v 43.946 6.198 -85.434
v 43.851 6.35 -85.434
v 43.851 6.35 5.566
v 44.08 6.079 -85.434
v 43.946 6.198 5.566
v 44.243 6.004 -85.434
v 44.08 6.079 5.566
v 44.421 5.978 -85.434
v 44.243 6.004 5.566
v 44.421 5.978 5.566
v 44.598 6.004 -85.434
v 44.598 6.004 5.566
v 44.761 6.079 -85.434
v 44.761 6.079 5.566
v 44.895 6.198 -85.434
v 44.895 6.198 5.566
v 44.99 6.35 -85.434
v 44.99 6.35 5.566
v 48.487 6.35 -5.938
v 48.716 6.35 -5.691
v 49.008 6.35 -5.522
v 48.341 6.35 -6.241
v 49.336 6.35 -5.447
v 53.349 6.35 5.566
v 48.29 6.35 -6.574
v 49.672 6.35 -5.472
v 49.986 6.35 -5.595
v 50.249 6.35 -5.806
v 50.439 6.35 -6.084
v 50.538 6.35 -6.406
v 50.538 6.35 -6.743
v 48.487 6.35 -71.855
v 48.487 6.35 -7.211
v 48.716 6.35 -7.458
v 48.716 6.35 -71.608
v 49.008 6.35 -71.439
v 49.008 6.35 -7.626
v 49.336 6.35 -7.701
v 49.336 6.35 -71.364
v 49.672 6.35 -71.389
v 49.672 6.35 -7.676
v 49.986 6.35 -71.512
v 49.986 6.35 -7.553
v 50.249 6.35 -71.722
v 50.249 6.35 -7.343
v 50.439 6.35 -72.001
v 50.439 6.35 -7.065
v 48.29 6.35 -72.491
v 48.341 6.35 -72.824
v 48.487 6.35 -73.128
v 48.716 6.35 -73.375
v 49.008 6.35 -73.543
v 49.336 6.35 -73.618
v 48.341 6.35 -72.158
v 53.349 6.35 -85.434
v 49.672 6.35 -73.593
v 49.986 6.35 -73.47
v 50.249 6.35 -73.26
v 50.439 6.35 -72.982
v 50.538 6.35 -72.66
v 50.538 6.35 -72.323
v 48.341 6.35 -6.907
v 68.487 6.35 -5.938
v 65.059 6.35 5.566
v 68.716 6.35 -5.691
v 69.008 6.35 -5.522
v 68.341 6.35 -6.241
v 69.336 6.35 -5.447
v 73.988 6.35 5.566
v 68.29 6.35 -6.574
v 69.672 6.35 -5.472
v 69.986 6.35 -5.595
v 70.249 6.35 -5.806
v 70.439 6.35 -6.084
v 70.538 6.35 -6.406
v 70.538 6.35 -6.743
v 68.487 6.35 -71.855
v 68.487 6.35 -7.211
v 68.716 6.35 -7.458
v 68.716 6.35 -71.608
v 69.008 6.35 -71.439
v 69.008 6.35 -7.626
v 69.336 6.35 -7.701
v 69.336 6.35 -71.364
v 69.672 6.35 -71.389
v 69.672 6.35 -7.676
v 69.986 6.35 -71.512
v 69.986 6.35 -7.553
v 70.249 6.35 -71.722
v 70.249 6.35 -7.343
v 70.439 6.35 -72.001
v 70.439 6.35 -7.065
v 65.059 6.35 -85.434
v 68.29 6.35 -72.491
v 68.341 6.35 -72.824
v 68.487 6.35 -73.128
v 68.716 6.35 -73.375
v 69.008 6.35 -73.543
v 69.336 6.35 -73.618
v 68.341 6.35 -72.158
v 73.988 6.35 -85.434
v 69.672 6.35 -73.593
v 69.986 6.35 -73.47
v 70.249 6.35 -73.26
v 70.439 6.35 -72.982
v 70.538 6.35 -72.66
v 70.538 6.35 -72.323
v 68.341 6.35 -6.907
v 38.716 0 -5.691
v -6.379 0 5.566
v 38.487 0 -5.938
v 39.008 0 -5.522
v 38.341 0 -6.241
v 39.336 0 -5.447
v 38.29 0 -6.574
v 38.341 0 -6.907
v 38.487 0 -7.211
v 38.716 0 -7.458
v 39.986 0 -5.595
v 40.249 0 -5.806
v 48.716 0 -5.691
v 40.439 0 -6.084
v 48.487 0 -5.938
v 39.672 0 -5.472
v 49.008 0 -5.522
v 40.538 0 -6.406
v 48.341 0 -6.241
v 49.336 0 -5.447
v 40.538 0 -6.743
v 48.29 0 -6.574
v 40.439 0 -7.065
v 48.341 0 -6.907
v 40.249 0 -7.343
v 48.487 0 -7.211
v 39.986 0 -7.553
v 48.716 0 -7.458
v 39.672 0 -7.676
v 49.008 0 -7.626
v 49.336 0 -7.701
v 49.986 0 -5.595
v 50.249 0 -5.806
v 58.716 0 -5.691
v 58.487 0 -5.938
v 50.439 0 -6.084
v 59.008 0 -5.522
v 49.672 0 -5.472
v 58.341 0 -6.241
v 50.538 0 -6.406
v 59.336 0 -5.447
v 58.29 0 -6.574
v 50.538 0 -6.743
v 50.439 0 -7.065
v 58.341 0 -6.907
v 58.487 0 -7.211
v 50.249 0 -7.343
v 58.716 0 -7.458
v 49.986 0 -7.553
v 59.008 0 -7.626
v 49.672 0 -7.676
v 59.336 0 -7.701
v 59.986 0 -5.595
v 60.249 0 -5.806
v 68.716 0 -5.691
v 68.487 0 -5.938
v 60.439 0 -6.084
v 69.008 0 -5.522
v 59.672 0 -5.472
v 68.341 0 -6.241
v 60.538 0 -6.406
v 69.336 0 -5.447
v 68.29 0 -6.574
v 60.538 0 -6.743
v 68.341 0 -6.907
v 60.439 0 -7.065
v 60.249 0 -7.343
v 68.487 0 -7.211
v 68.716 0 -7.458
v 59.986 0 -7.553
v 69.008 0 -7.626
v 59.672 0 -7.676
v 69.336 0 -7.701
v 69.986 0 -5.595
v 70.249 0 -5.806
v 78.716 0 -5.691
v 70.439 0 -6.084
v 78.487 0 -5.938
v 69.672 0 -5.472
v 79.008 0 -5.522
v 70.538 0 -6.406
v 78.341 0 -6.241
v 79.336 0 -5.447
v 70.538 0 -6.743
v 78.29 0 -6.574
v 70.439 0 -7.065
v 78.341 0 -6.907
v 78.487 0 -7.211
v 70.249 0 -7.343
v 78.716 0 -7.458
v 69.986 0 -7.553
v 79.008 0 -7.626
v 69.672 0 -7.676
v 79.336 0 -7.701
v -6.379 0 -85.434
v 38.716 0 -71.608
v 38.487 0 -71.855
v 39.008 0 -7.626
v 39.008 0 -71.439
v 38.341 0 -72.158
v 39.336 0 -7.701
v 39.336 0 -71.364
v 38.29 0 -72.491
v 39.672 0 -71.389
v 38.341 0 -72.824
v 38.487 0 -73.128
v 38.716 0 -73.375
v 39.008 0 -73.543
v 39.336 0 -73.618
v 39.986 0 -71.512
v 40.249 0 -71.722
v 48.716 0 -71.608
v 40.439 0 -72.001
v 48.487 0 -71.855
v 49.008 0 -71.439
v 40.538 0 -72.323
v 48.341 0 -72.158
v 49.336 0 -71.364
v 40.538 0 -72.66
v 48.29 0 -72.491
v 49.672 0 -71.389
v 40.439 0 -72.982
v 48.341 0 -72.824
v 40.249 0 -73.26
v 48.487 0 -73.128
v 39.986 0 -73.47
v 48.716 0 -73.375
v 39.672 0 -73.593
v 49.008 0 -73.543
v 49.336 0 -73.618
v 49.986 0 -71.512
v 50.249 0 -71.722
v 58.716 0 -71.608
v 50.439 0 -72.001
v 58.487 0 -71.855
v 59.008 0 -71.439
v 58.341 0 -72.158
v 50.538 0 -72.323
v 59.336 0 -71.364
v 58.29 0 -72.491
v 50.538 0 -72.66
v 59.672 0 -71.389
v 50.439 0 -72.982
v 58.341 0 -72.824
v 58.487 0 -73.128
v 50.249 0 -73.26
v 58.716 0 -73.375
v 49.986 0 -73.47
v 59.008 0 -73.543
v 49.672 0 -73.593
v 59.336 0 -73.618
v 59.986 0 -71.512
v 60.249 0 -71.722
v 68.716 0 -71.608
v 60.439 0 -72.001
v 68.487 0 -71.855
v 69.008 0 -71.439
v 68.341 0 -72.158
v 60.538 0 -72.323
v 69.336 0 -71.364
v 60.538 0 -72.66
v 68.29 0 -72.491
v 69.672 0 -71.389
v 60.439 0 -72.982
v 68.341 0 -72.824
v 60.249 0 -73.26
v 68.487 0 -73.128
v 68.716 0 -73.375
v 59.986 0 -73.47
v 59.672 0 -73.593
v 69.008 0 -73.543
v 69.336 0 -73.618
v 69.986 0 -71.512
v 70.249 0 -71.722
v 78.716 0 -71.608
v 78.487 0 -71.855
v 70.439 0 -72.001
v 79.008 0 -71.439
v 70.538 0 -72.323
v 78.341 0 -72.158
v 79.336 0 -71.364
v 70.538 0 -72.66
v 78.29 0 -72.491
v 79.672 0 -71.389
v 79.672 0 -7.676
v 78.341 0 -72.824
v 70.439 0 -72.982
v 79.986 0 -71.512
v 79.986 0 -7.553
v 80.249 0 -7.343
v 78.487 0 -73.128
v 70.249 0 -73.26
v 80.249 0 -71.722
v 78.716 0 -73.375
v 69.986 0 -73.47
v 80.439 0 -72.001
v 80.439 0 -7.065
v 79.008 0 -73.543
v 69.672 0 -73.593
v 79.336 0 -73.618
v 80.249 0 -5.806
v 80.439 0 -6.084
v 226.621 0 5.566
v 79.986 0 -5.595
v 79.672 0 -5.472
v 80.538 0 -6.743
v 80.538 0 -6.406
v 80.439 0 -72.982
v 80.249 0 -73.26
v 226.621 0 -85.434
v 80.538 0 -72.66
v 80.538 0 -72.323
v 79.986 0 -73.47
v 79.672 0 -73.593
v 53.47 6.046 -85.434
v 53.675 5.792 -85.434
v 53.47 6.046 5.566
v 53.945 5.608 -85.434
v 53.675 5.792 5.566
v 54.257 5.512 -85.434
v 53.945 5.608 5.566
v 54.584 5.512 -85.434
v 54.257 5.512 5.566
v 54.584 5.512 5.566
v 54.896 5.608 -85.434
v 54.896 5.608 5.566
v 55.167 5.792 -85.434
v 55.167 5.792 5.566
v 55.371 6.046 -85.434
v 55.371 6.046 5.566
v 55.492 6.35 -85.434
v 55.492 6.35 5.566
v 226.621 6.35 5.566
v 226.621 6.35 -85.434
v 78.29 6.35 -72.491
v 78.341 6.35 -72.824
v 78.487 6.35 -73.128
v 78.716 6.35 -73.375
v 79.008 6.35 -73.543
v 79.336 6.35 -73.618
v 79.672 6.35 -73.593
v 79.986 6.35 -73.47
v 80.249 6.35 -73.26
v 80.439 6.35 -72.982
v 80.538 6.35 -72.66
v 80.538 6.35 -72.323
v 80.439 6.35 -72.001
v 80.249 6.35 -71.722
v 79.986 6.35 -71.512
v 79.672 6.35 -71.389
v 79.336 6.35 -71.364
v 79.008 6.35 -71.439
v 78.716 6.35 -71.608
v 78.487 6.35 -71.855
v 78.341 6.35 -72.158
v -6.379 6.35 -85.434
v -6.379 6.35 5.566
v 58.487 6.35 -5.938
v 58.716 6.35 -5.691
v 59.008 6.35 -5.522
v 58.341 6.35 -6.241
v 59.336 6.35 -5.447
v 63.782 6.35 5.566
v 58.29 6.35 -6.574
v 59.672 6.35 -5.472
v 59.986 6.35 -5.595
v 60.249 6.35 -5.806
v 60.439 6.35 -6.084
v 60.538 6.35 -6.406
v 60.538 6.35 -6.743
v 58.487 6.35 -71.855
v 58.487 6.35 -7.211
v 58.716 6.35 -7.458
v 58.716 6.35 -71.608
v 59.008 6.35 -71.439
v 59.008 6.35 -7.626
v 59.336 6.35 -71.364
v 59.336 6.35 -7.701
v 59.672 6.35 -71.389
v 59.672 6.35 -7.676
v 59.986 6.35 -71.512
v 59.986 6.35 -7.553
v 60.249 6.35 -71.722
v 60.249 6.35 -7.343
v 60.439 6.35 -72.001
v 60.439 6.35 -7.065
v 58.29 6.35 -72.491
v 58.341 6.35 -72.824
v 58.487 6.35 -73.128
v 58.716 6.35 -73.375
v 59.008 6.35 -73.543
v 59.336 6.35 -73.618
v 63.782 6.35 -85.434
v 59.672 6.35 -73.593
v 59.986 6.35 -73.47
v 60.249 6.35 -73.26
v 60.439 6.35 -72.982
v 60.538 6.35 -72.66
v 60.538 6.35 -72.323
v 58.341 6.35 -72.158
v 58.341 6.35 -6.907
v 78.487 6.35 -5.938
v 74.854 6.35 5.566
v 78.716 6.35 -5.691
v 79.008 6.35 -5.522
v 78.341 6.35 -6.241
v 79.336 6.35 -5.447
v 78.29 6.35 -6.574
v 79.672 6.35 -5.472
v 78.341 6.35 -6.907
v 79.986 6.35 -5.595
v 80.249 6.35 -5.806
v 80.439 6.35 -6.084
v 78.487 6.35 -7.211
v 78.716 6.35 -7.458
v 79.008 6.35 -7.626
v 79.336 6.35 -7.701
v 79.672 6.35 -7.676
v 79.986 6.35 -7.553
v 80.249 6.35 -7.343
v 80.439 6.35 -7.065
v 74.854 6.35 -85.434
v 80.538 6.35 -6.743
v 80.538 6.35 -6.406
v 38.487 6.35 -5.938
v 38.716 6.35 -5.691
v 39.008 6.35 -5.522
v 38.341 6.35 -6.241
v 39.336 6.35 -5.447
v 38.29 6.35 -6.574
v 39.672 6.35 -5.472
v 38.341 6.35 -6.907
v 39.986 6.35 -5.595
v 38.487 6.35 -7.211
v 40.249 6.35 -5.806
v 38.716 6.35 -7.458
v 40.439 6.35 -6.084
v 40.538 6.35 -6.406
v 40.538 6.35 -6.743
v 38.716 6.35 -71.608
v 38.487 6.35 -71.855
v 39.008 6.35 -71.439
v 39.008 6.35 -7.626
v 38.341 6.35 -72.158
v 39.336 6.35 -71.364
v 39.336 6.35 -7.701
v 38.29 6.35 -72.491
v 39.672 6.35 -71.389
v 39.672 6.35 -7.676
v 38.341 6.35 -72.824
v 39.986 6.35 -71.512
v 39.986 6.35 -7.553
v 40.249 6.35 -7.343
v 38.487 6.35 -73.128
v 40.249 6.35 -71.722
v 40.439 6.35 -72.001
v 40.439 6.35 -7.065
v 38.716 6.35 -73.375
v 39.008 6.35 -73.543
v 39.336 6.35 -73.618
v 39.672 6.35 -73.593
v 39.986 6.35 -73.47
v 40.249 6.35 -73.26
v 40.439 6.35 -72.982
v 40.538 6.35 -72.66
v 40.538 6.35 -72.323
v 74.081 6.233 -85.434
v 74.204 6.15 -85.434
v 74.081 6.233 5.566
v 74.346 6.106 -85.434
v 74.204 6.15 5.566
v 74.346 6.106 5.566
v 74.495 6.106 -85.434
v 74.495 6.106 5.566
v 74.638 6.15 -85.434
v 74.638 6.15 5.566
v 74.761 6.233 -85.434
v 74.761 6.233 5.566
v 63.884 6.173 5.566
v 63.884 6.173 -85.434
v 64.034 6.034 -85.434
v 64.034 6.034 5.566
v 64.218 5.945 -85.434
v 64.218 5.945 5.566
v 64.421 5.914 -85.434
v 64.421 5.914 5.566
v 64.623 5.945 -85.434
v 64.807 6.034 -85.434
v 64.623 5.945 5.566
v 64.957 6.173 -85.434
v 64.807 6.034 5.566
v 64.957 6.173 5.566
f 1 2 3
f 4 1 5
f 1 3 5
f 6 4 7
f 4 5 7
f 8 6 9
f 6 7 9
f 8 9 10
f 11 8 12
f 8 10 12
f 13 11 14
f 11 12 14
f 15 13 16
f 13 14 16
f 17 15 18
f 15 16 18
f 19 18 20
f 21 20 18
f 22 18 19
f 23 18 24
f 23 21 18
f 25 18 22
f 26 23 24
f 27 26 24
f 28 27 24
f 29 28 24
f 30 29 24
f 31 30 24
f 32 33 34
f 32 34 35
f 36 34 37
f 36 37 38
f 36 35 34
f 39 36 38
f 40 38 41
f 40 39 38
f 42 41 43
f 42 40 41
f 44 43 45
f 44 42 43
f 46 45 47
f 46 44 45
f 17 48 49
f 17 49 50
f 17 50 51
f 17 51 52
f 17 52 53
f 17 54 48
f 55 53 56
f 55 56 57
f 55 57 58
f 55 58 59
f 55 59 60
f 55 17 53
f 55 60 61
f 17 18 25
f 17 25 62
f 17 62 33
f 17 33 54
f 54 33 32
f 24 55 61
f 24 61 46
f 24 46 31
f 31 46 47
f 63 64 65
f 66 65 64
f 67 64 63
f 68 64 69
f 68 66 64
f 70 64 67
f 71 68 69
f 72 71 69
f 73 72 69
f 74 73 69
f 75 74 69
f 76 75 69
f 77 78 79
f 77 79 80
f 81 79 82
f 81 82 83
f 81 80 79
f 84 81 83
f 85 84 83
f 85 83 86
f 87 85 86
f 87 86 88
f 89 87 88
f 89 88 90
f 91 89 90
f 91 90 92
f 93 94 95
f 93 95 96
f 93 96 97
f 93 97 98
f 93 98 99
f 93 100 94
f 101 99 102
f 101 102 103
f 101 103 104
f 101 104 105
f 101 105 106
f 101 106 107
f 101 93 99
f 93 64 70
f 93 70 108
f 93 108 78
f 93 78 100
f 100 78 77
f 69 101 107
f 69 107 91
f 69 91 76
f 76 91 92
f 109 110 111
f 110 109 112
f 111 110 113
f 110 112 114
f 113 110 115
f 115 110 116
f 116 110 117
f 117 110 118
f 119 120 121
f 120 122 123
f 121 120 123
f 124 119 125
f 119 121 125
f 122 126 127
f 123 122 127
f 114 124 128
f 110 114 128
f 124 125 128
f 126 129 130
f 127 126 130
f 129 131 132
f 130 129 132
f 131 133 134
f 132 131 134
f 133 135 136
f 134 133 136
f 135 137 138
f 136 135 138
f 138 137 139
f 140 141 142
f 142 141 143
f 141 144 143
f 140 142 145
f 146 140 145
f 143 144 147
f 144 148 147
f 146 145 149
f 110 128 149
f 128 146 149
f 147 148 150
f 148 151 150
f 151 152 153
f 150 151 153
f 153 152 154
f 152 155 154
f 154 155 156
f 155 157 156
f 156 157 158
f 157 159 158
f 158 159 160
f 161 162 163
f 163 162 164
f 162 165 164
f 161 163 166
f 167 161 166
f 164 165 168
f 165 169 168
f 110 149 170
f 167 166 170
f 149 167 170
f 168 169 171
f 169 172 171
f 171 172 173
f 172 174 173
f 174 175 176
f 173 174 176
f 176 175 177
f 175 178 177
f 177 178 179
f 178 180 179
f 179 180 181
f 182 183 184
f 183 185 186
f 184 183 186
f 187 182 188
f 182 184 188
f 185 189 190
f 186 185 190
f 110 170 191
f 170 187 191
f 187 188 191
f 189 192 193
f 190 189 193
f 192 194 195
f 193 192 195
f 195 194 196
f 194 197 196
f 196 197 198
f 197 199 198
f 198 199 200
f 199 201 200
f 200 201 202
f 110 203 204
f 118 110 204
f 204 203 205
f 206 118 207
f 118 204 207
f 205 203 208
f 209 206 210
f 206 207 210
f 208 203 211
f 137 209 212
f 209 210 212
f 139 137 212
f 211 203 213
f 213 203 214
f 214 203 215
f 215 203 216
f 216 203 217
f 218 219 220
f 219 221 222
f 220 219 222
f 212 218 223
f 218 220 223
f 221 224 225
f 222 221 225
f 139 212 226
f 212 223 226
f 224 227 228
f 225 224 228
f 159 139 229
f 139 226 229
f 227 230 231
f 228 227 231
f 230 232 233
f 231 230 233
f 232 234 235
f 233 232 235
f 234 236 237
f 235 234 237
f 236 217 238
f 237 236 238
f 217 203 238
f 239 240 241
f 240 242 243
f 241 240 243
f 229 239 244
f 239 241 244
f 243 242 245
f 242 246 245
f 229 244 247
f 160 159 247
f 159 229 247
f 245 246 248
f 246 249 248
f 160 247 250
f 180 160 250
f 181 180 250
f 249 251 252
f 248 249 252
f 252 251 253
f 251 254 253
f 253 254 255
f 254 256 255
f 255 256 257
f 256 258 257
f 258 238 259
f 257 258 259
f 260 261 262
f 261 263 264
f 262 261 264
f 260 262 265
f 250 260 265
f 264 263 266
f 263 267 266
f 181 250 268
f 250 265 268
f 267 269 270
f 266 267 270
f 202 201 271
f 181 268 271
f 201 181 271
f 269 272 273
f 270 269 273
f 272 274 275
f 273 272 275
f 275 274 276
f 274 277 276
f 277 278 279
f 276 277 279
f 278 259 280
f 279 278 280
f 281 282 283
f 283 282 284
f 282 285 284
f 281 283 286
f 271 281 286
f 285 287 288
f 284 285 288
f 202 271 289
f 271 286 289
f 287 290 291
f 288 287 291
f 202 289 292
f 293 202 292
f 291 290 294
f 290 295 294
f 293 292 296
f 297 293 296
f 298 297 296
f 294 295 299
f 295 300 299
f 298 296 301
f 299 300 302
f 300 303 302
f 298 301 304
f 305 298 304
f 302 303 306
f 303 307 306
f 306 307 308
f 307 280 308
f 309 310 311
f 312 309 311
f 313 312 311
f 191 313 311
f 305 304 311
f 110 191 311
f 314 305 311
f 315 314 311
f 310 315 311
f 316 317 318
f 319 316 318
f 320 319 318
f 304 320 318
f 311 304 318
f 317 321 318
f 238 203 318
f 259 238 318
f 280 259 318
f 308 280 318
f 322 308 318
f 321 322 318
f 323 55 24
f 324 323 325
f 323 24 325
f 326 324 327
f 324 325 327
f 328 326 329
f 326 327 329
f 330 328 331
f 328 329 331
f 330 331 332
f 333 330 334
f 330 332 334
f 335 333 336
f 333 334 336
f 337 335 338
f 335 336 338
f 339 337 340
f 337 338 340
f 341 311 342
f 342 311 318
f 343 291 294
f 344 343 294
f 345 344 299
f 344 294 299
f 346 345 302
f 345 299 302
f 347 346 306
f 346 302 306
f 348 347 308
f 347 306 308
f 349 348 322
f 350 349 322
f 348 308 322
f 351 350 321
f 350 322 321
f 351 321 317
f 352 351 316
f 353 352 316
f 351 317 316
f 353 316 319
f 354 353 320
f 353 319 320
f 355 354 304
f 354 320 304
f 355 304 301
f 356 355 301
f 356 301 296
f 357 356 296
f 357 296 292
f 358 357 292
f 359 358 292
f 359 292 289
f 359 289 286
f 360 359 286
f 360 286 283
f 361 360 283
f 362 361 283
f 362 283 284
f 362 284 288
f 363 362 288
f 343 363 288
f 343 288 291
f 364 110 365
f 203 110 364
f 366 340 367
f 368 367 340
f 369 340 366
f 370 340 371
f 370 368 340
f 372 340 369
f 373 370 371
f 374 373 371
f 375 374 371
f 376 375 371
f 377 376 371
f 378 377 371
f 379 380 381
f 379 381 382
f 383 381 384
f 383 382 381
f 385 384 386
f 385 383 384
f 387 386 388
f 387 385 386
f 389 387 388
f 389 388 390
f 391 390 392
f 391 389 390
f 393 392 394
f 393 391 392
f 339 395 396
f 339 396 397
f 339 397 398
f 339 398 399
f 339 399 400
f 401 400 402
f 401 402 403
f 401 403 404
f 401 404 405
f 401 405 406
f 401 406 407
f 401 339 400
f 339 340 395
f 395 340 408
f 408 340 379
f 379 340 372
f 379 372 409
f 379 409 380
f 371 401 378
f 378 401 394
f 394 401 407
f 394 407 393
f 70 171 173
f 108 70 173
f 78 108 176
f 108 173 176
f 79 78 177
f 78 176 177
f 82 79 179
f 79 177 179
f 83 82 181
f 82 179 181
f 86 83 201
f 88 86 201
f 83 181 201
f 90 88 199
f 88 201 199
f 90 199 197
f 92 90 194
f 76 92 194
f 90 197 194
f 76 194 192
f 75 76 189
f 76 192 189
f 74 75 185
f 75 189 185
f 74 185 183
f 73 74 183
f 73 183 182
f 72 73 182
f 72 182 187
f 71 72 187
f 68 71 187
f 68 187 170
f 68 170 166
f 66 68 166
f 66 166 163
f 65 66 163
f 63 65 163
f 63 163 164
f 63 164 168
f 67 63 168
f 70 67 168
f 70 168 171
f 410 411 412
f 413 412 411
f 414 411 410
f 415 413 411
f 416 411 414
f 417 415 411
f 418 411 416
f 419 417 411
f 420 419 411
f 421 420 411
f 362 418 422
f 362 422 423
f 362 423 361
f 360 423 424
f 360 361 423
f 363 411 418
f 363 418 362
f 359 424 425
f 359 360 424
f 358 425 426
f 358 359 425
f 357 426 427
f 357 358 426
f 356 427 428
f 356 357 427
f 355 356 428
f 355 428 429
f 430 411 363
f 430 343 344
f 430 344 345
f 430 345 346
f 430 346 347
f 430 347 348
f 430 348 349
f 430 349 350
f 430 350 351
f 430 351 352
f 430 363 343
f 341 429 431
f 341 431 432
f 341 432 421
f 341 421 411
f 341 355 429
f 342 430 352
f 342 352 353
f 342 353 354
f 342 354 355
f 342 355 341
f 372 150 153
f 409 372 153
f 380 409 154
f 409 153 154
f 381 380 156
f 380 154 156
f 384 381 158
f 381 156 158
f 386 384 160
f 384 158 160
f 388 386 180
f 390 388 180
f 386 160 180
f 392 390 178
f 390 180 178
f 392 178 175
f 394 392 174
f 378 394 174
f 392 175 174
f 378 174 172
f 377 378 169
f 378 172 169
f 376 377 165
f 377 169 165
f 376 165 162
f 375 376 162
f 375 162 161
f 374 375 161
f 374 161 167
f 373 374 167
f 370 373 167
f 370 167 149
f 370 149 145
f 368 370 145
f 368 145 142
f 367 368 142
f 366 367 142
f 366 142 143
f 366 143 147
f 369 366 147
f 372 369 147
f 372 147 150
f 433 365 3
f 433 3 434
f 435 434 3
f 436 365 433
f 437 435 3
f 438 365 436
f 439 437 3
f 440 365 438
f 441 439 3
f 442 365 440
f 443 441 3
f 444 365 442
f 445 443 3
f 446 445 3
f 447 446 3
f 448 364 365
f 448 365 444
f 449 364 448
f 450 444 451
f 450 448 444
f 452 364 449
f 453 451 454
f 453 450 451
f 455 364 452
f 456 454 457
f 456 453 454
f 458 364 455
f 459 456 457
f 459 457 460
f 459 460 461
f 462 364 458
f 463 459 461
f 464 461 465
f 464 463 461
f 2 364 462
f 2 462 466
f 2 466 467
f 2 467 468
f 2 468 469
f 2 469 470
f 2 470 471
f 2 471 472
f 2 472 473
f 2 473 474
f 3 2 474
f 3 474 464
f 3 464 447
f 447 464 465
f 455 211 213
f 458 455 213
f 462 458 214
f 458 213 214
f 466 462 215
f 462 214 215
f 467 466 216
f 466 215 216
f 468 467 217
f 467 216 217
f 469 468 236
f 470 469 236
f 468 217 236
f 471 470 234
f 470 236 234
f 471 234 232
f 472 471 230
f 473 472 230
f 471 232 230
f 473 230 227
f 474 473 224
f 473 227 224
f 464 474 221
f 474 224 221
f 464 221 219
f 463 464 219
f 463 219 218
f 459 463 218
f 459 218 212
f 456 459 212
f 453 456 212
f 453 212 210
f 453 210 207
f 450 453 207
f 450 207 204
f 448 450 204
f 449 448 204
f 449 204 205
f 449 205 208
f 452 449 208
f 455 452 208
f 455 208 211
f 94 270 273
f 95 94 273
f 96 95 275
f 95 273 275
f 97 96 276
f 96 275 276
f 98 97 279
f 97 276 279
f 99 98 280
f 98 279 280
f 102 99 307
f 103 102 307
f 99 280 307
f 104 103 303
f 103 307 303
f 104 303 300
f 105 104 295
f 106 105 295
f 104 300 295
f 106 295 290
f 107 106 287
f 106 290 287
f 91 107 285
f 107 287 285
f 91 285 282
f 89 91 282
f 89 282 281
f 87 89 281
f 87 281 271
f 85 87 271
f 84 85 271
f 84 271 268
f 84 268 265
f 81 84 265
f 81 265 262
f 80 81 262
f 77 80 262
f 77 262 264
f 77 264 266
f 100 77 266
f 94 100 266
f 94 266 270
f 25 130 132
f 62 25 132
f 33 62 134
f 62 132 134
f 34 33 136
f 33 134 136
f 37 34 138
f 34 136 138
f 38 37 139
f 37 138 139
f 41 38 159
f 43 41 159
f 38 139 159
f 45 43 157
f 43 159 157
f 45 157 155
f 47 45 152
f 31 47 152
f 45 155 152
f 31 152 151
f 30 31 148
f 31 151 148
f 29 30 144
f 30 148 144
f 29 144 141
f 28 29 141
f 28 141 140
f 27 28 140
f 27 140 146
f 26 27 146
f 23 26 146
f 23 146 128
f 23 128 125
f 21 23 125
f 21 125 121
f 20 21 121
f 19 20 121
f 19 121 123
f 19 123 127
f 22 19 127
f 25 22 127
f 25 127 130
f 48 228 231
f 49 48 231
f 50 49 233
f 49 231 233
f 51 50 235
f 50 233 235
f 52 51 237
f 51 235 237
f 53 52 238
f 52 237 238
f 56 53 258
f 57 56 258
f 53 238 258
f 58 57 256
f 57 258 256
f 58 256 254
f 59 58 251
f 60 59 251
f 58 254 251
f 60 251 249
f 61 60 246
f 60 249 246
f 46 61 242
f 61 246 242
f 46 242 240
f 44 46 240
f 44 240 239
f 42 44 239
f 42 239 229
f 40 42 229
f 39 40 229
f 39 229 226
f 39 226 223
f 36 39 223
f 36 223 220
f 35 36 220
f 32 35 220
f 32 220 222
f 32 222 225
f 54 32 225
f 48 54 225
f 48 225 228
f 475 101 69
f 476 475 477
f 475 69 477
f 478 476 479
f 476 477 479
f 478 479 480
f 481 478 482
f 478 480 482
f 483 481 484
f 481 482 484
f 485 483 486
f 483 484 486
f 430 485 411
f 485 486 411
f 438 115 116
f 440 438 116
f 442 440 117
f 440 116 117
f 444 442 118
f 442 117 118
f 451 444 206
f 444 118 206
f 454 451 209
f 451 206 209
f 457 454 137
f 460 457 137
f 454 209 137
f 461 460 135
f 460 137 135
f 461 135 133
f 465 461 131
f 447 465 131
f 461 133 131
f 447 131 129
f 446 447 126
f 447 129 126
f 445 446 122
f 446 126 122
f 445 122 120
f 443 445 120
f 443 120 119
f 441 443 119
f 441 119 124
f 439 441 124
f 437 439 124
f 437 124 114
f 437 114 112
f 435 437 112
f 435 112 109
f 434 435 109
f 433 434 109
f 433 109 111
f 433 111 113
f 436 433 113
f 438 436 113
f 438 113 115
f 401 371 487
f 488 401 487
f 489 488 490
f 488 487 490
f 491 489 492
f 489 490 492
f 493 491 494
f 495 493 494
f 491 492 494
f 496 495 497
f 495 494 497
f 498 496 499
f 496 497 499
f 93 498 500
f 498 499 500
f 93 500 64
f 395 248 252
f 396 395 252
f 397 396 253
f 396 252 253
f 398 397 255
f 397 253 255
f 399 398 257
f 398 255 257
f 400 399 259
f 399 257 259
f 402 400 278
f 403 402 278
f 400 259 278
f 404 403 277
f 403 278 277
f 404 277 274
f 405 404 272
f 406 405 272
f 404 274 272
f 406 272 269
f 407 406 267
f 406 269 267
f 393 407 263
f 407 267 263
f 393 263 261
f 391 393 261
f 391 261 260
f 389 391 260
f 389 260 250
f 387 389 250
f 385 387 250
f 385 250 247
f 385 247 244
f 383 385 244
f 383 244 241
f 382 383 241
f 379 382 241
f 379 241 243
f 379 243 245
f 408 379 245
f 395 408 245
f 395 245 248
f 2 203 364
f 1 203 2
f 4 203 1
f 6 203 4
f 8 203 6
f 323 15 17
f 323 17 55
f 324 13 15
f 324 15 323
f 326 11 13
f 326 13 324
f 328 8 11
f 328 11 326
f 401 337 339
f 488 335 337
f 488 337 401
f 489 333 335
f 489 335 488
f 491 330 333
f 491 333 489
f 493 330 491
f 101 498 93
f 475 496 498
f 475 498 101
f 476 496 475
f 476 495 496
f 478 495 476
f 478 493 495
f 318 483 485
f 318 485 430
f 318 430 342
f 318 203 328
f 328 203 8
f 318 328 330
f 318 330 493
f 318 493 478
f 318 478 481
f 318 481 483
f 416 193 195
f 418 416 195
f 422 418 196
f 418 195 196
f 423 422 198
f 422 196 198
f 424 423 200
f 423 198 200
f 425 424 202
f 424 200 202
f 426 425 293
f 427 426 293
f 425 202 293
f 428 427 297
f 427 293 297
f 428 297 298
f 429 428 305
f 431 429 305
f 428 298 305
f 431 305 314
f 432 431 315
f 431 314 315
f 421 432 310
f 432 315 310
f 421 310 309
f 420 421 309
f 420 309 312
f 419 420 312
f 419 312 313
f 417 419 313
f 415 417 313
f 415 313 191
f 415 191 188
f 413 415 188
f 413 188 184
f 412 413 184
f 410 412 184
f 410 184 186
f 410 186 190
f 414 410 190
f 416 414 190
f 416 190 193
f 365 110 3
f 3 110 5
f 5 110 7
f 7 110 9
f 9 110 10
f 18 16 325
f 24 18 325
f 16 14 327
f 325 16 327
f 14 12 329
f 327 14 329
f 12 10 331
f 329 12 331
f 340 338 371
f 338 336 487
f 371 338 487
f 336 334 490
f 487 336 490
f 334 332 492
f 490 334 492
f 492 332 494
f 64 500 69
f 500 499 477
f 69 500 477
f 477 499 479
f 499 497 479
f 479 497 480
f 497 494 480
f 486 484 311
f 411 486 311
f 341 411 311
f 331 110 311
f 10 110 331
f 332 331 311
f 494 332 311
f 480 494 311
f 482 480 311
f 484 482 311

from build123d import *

# Parameters (mm, degrees)
SKETCH1_W             = 233
SKETCH1_H             = 91
BOSS_EXTRUDE1_DEPTH   = 6.35
SKETCH2_R             = 0.6223
SKETCH2_R_2           = 1.1
SKETCH2_R_3           = 0.6858
SKETCH2_R_4           = 0.5
CUT_EXTRUDE1_DEPTH    = 245.291275438
F_4_40_TAPPED_HOLE1_D = 2.2606


with BuildPart() as part:
    # Sketch1 → Boss-Extrude1 (new body)
    with BuildSketch(Plane(origin=(0, 0, 0), x_dir=(1, 0, 0), z_dir=(0, 1, 0))):
        with Locations((110.120618557, 39.933676976)):
            Rectangle(SKETCH1_W, SKETCH1_H)
    extrude(amount=BOSS_EXTRUDE1_DEPTH)

    # Sketch2 → Cut-Extrude1 (cut, through all)
    with BuildSketch(Plane.XY.offset(5.566323024)):
        with Locations((44.420618557, 6.6)):
            Circle(SKETCH2_R)
        with Locations((54.420618557, 6.6)):
            Circle(SKETCH2_R_2)
        with Locations((64.420618557, 6.6)):
            Circle(SKETCH2_R_3)
        with Locations((74.420618557, 6.6)):
            Circle(SKETCH2_R_4)
    extrude(amount=-CUT_EXTRUDE1_DEPTH, mode=Mode.SUBTRACT)

    # #4-40 Tapped Hole1 (through all)
    with Locations(Plane(origin=(0, 6.35, 0), x_dir=(1, 0, 0), z_dir=(0, 1, 0))):
        with Locations((39.420618557, 72.491246031), (59.420618557, 72.491246031), (49.420618557, 72.491246031), (49.420618557, 6.5743166), (39.420618557, 6.5743166), (59.420618557, 6.5743166), (69.420618557, 72.491246031), (79.420618557, 72.491246031), (69.420618557, 6.5743166), (79.420618557, 6.5743166)):
            Hole(F_4_40_TAPPED_HOLE1_D / 2)


solid = part.part
